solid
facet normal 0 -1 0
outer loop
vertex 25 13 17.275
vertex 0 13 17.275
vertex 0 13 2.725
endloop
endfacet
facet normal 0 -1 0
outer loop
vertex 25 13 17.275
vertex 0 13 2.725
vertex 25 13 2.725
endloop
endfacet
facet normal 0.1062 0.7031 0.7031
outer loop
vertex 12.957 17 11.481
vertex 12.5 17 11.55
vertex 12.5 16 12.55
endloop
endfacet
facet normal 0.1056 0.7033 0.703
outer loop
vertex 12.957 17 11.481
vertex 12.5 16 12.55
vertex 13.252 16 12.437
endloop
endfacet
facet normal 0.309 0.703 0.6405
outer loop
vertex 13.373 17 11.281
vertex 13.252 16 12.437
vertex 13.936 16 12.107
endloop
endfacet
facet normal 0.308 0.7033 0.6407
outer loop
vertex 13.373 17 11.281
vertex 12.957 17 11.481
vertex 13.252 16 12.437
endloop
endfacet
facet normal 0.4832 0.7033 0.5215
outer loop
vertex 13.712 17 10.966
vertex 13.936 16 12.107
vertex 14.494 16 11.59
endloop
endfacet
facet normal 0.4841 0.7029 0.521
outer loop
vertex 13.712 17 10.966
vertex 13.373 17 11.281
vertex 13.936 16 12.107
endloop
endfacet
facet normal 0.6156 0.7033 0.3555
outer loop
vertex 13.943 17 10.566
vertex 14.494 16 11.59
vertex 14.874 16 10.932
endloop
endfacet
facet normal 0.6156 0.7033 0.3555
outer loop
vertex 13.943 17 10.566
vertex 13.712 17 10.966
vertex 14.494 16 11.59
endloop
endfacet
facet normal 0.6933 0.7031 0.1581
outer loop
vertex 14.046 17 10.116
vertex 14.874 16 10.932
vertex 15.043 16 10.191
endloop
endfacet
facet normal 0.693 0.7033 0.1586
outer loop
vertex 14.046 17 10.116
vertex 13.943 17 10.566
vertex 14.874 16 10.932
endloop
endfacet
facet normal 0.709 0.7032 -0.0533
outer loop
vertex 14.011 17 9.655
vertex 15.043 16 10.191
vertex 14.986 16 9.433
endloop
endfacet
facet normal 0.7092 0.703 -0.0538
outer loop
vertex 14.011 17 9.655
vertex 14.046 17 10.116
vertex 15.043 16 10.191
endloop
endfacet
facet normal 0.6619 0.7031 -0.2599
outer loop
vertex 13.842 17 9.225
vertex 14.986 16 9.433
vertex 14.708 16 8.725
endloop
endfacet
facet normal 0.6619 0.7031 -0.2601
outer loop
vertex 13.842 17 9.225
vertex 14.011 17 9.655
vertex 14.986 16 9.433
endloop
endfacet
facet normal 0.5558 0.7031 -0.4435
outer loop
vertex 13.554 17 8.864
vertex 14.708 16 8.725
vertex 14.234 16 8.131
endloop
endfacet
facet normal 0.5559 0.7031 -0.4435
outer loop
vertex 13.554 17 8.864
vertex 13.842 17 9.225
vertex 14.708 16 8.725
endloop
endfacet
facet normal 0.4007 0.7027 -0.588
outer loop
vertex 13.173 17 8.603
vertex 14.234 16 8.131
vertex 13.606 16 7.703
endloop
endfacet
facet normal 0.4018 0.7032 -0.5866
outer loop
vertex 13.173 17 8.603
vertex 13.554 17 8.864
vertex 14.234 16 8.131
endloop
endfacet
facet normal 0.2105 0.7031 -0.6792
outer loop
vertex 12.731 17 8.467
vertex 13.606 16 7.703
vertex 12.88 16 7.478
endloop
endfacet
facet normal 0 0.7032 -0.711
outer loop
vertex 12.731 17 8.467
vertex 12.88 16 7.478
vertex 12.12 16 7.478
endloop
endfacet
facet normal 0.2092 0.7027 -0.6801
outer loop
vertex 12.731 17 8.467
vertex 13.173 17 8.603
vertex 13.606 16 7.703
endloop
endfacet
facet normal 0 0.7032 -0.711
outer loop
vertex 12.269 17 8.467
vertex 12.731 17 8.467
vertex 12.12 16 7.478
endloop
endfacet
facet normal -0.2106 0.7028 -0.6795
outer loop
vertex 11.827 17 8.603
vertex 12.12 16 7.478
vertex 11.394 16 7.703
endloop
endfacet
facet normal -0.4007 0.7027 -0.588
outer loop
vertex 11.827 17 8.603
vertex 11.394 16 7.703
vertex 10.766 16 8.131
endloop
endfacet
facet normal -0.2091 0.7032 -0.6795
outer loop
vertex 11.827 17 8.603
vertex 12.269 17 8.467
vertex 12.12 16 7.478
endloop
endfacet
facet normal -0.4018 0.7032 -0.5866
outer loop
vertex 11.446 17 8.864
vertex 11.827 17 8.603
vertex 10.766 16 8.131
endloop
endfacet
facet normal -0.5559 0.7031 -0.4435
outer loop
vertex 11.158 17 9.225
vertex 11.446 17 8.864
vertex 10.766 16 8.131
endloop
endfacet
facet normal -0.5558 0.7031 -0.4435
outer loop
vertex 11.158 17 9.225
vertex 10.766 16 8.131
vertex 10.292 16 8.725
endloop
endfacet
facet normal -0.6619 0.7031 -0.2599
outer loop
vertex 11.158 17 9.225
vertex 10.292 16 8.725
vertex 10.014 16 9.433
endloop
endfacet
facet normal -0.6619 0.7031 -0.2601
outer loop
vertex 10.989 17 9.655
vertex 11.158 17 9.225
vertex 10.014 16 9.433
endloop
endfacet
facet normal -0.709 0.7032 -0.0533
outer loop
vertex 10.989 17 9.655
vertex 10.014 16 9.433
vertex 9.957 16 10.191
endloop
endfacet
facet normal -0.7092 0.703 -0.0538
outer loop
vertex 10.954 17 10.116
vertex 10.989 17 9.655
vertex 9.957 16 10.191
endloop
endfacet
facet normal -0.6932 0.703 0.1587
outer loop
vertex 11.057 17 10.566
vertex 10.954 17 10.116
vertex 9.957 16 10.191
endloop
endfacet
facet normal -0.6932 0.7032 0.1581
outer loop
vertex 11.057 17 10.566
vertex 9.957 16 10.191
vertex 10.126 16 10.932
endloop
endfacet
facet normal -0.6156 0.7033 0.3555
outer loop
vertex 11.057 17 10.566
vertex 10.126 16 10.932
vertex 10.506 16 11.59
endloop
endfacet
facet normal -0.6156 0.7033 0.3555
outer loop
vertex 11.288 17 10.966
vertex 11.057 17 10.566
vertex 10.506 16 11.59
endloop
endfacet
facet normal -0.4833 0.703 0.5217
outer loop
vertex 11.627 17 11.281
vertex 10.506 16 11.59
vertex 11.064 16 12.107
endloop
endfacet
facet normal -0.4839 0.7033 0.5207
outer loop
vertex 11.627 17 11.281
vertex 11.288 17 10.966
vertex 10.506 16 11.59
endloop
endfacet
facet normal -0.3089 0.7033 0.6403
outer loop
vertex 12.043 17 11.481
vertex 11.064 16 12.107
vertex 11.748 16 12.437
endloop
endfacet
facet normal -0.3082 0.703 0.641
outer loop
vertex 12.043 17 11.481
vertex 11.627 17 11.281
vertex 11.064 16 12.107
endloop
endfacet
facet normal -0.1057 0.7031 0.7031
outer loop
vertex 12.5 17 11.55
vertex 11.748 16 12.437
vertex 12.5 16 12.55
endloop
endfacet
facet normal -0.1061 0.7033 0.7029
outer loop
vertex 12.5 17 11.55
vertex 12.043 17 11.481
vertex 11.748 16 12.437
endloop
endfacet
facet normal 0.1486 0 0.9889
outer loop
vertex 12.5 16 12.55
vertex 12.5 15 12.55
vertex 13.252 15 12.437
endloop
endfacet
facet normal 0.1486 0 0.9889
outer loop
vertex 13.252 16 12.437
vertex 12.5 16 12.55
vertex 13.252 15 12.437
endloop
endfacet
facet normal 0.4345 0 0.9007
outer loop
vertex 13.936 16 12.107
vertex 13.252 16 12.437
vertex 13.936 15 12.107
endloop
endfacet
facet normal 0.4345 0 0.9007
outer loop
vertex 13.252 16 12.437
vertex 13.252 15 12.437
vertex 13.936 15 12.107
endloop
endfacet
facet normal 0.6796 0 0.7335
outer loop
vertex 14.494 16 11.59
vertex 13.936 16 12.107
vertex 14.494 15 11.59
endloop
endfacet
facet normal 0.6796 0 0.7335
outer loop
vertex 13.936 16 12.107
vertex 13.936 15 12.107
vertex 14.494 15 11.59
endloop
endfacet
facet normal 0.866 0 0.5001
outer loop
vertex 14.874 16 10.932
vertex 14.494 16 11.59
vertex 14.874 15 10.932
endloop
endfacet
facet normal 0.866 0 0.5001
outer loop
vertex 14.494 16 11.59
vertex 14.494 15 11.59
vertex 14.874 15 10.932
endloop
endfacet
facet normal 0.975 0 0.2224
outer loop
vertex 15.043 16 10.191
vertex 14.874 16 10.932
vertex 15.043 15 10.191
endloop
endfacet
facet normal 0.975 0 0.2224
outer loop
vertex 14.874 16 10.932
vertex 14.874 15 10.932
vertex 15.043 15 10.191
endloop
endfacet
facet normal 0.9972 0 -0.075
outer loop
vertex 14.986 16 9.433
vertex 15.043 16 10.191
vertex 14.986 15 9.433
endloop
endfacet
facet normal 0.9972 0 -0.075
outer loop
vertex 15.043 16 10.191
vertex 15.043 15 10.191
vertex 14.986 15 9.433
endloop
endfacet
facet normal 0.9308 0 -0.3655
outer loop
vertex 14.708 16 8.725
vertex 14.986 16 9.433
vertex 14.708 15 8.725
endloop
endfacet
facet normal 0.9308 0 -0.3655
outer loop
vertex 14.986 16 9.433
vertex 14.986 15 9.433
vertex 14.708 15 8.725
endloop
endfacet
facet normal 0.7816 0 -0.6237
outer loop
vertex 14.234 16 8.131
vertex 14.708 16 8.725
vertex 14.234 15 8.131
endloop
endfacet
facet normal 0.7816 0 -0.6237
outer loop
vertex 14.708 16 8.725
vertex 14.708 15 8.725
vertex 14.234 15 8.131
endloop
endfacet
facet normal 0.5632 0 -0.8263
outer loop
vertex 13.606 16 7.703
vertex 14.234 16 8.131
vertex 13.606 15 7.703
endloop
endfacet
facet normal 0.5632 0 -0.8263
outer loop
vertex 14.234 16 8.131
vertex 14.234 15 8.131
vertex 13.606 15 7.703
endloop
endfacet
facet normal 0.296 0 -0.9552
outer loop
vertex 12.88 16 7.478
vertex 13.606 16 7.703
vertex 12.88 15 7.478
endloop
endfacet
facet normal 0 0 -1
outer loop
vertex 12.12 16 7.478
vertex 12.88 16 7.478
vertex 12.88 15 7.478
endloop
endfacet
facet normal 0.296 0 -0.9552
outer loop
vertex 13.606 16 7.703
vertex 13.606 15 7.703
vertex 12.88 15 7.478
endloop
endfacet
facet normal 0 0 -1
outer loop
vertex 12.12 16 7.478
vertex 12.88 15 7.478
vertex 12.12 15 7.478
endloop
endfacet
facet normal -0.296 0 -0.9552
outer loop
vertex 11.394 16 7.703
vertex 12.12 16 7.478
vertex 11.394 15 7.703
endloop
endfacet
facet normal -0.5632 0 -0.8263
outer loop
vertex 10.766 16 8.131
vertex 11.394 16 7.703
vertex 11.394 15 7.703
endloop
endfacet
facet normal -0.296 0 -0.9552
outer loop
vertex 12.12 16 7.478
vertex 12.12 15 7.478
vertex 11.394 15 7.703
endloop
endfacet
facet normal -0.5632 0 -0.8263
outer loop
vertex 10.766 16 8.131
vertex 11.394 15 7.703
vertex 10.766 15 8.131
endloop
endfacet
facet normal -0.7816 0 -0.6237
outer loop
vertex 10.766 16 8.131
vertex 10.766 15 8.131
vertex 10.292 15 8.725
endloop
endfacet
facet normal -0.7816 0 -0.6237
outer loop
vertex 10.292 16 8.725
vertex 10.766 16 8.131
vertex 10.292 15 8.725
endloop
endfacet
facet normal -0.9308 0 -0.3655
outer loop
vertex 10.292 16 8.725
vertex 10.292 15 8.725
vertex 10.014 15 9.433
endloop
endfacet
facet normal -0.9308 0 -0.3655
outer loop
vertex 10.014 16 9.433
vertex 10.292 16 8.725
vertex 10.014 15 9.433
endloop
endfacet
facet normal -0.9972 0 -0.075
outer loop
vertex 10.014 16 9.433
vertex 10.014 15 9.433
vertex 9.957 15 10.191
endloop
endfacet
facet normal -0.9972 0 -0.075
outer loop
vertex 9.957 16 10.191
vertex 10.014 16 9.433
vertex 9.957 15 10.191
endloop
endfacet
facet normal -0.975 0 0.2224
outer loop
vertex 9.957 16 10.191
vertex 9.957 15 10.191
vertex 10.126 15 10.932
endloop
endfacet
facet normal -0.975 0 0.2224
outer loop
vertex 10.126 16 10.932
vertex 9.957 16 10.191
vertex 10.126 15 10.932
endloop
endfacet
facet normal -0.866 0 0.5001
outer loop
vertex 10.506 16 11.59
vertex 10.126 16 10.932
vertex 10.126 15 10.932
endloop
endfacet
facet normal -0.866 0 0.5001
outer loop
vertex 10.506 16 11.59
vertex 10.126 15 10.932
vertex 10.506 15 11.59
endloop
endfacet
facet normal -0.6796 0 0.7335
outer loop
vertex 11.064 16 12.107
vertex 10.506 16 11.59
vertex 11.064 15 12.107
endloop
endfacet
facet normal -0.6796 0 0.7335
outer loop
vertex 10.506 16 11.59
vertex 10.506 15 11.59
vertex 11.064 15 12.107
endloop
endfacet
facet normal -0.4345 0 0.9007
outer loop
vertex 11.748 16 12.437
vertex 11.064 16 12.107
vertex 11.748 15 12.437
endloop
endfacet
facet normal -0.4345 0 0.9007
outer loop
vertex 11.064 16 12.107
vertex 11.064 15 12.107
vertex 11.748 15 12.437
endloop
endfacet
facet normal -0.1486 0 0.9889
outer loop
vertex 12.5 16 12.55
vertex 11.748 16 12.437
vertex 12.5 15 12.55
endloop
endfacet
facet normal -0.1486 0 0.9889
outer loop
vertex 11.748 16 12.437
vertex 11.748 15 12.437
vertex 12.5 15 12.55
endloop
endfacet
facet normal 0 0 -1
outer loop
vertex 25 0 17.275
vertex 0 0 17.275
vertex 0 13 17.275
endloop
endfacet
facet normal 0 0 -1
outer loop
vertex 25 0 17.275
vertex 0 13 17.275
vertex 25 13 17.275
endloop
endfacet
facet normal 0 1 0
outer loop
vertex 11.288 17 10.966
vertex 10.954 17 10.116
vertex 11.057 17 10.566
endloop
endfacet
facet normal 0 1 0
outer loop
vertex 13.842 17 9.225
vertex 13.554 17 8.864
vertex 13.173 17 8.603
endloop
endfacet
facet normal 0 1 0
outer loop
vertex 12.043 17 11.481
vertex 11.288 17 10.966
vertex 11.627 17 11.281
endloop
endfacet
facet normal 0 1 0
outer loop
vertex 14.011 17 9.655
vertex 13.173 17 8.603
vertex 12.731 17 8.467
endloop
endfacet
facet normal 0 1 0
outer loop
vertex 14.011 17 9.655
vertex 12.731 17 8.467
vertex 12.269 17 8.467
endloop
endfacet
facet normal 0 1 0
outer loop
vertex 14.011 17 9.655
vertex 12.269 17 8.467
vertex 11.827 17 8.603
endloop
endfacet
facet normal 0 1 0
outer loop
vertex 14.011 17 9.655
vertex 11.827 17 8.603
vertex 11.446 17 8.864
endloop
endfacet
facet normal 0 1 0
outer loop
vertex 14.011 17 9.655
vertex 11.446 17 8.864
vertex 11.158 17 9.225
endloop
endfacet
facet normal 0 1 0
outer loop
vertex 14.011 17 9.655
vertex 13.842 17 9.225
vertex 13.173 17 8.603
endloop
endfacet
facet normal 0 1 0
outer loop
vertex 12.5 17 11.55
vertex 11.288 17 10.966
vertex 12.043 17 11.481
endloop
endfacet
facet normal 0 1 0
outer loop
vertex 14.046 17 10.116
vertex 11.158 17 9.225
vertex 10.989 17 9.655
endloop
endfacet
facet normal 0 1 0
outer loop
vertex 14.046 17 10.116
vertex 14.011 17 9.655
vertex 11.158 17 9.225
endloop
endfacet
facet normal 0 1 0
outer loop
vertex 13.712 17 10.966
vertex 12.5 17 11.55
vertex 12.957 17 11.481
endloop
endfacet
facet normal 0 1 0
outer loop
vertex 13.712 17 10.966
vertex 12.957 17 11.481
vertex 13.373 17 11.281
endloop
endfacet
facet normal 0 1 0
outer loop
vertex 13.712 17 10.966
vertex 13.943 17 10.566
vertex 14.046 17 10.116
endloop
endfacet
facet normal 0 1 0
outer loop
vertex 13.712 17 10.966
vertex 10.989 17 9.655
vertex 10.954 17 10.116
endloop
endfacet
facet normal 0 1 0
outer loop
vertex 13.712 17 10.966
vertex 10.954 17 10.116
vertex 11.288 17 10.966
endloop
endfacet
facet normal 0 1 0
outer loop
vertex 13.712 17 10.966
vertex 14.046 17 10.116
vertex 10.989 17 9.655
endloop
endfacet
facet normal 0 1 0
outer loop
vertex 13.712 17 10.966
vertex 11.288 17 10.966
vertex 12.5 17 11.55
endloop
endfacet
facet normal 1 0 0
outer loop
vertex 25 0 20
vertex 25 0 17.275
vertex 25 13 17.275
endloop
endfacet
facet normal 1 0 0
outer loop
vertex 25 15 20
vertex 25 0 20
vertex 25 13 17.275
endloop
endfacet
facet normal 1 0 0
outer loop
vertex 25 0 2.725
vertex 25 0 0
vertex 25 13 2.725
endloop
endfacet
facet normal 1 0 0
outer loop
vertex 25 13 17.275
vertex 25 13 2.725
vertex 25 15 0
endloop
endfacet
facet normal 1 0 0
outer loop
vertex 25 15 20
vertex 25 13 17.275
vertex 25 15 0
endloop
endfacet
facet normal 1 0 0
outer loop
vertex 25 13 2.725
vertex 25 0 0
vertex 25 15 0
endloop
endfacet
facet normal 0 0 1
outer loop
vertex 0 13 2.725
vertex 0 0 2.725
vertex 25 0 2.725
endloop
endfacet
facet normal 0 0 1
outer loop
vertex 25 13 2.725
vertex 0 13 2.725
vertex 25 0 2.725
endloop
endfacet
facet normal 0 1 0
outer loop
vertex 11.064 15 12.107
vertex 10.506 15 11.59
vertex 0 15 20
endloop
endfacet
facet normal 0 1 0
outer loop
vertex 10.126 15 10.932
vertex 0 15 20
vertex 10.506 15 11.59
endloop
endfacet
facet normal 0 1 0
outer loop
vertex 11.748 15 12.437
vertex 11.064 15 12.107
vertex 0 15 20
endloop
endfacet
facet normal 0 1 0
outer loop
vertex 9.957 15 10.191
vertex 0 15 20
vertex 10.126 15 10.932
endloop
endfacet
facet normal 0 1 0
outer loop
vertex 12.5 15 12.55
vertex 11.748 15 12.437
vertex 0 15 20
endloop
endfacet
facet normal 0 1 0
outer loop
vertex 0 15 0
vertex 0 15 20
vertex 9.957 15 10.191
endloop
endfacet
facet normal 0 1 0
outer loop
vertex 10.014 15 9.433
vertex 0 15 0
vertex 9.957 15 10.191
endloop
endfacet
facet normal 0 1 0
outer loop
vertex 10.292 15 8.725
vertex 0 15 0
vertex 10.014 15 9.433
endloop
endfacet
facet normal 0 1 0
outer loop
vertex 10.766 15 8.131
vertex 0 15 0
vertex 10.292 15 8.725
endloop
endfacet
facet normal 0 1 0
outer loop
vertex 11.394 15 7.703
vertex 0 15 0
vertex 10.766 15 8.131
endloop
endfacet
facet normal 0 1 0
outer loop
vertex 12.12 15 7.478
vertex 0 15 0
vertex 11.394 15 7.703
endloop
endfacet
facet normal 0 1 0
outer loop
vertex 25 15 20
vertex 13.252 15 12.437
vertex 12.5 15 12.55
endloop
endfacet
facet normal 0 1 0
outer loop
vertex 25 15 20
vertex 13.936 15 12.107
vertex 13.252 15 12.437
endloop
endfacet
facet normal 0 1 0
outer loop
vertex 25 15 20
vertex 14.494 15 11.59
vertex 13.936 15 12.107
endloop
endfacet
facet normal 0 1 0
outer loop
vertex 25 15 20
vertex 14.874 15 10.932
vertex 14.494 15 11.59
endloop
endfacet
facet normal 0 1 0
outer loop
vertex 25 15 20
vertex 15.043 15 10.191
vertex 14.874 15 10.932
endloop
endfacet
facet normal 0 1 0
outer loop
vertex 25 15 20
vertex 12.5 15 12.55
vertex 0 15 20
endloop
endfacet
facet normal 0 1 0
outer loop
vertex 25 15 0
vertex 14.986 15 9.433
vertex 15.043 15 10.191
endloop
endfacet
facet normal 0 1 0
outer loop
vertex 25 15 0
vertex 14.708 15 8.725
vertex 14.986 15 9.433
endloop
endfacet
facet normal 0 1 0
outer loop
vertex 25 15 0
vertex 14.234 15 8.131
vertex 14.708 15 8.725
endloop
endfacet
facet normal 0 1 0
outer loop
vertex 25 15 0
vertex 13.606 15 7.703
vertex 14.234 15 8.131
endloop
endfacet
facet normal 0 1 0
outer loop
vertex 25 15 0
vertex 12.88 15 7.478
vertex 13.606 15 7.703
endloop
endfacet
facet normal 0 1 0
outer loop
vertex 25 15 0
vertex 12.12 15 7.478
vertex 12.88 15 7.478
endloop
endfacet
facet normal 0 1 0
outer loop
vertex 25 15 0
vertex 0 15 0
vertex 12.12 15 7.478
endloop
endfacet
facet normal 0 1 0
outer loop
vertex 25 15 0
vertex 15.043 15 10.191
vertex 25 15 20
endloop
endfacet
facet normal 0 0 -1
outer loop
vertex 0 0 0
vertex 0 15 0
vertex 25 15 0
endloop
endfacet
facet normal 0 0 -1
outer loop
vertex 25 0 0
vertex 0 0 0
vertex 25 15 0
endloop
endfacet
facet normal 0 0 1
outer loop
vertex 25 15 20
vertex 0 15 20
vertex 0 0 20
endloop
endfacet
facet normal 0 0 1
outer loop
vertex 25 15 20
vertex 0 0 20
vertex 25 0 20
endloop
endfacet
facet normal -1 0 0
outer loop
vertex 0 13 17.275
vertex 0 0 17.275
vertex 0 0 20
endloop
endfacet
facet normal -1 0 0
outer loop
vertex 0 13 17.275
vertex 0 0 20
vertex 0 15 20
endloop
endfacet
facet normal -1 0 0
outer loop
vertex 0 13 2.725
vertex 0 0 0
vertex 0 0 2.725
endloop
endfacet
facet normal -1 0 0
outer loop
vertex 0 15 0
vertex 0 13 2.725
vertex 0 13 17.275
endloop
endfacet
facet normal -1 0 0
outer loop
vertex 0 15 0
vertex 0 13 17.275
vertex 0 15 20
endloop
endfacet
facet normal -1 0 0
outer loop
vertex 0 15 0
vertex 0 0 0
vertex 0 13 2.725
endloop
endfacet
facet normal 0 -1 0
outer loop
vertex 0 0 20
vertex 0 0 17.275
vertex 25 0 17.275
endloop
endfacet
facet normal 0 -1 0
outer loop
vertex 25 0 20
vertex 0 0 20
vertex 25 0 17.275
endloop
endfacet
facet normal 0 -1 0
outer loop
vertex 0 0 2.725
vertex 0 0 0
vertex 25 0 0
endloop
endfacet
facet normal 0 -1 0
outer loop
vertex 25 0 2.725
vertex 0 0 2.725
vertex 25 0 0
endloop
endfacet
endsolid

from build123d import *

# Parameters (mm, degrees)
SKETCH1_W           = 25
SKETCH1_H           = 15
BOSS_EXTRUDE1_DEPTH = 20
SKETCH2_W           = 25
SKETCH2_H           = 14.55
CUT_EXTRUDE1_DEPTH  = 13
SKETCH4_R           = 2.55
BOSS_EXTRUDE2_DEPTH = 2
CHAMFER1_SIZE       = 1


with BuildPart() as part:
    # Sketch1 → Boss-Extrude1 (new body)
    with BuildSketch(Plane.XY):
        with Locations((12.5, 7.5)):
            Rectangle(SKETCH1_W, SKETCH1_H)
    extrude(amount=BOSS_EXTRUDE1_DEPTH)

    # Sketch2 → Cut-Extrude1 (cut)
    with BuildSketch(Plane.XZ):
        with Locations((12.5, 10)):
            Rectangle(SKETCH2_W, SKETCH2_H)
    extrude(amount=-CUT_EXTRUDE1_DEPTH, mode=Mode.SUBTRACT)

    # Sketch4 → Boss-Extrude2 (add)
    with BuildSketch(Plane(origin=(0, 15, 0), x_dir=(1, 0, 0), z_dir=(0, 1, 0))):
        with Locations(Location((12.5, -10, 0), (0, 0, 270))):
            Circle(SKETCH4_R)
    extrude(amount=BOSS_EXTRUDE2_DEPTH)

    # Chamfer1
    chamfer1_edges = [part.edges().sort_by_distance(p)[0] for p in [
        (12.5, 17, 7.45),
    ]]
    chamfer(chamfer1_edges, length=CHAMFER1_SIZE)


solid = part.part
